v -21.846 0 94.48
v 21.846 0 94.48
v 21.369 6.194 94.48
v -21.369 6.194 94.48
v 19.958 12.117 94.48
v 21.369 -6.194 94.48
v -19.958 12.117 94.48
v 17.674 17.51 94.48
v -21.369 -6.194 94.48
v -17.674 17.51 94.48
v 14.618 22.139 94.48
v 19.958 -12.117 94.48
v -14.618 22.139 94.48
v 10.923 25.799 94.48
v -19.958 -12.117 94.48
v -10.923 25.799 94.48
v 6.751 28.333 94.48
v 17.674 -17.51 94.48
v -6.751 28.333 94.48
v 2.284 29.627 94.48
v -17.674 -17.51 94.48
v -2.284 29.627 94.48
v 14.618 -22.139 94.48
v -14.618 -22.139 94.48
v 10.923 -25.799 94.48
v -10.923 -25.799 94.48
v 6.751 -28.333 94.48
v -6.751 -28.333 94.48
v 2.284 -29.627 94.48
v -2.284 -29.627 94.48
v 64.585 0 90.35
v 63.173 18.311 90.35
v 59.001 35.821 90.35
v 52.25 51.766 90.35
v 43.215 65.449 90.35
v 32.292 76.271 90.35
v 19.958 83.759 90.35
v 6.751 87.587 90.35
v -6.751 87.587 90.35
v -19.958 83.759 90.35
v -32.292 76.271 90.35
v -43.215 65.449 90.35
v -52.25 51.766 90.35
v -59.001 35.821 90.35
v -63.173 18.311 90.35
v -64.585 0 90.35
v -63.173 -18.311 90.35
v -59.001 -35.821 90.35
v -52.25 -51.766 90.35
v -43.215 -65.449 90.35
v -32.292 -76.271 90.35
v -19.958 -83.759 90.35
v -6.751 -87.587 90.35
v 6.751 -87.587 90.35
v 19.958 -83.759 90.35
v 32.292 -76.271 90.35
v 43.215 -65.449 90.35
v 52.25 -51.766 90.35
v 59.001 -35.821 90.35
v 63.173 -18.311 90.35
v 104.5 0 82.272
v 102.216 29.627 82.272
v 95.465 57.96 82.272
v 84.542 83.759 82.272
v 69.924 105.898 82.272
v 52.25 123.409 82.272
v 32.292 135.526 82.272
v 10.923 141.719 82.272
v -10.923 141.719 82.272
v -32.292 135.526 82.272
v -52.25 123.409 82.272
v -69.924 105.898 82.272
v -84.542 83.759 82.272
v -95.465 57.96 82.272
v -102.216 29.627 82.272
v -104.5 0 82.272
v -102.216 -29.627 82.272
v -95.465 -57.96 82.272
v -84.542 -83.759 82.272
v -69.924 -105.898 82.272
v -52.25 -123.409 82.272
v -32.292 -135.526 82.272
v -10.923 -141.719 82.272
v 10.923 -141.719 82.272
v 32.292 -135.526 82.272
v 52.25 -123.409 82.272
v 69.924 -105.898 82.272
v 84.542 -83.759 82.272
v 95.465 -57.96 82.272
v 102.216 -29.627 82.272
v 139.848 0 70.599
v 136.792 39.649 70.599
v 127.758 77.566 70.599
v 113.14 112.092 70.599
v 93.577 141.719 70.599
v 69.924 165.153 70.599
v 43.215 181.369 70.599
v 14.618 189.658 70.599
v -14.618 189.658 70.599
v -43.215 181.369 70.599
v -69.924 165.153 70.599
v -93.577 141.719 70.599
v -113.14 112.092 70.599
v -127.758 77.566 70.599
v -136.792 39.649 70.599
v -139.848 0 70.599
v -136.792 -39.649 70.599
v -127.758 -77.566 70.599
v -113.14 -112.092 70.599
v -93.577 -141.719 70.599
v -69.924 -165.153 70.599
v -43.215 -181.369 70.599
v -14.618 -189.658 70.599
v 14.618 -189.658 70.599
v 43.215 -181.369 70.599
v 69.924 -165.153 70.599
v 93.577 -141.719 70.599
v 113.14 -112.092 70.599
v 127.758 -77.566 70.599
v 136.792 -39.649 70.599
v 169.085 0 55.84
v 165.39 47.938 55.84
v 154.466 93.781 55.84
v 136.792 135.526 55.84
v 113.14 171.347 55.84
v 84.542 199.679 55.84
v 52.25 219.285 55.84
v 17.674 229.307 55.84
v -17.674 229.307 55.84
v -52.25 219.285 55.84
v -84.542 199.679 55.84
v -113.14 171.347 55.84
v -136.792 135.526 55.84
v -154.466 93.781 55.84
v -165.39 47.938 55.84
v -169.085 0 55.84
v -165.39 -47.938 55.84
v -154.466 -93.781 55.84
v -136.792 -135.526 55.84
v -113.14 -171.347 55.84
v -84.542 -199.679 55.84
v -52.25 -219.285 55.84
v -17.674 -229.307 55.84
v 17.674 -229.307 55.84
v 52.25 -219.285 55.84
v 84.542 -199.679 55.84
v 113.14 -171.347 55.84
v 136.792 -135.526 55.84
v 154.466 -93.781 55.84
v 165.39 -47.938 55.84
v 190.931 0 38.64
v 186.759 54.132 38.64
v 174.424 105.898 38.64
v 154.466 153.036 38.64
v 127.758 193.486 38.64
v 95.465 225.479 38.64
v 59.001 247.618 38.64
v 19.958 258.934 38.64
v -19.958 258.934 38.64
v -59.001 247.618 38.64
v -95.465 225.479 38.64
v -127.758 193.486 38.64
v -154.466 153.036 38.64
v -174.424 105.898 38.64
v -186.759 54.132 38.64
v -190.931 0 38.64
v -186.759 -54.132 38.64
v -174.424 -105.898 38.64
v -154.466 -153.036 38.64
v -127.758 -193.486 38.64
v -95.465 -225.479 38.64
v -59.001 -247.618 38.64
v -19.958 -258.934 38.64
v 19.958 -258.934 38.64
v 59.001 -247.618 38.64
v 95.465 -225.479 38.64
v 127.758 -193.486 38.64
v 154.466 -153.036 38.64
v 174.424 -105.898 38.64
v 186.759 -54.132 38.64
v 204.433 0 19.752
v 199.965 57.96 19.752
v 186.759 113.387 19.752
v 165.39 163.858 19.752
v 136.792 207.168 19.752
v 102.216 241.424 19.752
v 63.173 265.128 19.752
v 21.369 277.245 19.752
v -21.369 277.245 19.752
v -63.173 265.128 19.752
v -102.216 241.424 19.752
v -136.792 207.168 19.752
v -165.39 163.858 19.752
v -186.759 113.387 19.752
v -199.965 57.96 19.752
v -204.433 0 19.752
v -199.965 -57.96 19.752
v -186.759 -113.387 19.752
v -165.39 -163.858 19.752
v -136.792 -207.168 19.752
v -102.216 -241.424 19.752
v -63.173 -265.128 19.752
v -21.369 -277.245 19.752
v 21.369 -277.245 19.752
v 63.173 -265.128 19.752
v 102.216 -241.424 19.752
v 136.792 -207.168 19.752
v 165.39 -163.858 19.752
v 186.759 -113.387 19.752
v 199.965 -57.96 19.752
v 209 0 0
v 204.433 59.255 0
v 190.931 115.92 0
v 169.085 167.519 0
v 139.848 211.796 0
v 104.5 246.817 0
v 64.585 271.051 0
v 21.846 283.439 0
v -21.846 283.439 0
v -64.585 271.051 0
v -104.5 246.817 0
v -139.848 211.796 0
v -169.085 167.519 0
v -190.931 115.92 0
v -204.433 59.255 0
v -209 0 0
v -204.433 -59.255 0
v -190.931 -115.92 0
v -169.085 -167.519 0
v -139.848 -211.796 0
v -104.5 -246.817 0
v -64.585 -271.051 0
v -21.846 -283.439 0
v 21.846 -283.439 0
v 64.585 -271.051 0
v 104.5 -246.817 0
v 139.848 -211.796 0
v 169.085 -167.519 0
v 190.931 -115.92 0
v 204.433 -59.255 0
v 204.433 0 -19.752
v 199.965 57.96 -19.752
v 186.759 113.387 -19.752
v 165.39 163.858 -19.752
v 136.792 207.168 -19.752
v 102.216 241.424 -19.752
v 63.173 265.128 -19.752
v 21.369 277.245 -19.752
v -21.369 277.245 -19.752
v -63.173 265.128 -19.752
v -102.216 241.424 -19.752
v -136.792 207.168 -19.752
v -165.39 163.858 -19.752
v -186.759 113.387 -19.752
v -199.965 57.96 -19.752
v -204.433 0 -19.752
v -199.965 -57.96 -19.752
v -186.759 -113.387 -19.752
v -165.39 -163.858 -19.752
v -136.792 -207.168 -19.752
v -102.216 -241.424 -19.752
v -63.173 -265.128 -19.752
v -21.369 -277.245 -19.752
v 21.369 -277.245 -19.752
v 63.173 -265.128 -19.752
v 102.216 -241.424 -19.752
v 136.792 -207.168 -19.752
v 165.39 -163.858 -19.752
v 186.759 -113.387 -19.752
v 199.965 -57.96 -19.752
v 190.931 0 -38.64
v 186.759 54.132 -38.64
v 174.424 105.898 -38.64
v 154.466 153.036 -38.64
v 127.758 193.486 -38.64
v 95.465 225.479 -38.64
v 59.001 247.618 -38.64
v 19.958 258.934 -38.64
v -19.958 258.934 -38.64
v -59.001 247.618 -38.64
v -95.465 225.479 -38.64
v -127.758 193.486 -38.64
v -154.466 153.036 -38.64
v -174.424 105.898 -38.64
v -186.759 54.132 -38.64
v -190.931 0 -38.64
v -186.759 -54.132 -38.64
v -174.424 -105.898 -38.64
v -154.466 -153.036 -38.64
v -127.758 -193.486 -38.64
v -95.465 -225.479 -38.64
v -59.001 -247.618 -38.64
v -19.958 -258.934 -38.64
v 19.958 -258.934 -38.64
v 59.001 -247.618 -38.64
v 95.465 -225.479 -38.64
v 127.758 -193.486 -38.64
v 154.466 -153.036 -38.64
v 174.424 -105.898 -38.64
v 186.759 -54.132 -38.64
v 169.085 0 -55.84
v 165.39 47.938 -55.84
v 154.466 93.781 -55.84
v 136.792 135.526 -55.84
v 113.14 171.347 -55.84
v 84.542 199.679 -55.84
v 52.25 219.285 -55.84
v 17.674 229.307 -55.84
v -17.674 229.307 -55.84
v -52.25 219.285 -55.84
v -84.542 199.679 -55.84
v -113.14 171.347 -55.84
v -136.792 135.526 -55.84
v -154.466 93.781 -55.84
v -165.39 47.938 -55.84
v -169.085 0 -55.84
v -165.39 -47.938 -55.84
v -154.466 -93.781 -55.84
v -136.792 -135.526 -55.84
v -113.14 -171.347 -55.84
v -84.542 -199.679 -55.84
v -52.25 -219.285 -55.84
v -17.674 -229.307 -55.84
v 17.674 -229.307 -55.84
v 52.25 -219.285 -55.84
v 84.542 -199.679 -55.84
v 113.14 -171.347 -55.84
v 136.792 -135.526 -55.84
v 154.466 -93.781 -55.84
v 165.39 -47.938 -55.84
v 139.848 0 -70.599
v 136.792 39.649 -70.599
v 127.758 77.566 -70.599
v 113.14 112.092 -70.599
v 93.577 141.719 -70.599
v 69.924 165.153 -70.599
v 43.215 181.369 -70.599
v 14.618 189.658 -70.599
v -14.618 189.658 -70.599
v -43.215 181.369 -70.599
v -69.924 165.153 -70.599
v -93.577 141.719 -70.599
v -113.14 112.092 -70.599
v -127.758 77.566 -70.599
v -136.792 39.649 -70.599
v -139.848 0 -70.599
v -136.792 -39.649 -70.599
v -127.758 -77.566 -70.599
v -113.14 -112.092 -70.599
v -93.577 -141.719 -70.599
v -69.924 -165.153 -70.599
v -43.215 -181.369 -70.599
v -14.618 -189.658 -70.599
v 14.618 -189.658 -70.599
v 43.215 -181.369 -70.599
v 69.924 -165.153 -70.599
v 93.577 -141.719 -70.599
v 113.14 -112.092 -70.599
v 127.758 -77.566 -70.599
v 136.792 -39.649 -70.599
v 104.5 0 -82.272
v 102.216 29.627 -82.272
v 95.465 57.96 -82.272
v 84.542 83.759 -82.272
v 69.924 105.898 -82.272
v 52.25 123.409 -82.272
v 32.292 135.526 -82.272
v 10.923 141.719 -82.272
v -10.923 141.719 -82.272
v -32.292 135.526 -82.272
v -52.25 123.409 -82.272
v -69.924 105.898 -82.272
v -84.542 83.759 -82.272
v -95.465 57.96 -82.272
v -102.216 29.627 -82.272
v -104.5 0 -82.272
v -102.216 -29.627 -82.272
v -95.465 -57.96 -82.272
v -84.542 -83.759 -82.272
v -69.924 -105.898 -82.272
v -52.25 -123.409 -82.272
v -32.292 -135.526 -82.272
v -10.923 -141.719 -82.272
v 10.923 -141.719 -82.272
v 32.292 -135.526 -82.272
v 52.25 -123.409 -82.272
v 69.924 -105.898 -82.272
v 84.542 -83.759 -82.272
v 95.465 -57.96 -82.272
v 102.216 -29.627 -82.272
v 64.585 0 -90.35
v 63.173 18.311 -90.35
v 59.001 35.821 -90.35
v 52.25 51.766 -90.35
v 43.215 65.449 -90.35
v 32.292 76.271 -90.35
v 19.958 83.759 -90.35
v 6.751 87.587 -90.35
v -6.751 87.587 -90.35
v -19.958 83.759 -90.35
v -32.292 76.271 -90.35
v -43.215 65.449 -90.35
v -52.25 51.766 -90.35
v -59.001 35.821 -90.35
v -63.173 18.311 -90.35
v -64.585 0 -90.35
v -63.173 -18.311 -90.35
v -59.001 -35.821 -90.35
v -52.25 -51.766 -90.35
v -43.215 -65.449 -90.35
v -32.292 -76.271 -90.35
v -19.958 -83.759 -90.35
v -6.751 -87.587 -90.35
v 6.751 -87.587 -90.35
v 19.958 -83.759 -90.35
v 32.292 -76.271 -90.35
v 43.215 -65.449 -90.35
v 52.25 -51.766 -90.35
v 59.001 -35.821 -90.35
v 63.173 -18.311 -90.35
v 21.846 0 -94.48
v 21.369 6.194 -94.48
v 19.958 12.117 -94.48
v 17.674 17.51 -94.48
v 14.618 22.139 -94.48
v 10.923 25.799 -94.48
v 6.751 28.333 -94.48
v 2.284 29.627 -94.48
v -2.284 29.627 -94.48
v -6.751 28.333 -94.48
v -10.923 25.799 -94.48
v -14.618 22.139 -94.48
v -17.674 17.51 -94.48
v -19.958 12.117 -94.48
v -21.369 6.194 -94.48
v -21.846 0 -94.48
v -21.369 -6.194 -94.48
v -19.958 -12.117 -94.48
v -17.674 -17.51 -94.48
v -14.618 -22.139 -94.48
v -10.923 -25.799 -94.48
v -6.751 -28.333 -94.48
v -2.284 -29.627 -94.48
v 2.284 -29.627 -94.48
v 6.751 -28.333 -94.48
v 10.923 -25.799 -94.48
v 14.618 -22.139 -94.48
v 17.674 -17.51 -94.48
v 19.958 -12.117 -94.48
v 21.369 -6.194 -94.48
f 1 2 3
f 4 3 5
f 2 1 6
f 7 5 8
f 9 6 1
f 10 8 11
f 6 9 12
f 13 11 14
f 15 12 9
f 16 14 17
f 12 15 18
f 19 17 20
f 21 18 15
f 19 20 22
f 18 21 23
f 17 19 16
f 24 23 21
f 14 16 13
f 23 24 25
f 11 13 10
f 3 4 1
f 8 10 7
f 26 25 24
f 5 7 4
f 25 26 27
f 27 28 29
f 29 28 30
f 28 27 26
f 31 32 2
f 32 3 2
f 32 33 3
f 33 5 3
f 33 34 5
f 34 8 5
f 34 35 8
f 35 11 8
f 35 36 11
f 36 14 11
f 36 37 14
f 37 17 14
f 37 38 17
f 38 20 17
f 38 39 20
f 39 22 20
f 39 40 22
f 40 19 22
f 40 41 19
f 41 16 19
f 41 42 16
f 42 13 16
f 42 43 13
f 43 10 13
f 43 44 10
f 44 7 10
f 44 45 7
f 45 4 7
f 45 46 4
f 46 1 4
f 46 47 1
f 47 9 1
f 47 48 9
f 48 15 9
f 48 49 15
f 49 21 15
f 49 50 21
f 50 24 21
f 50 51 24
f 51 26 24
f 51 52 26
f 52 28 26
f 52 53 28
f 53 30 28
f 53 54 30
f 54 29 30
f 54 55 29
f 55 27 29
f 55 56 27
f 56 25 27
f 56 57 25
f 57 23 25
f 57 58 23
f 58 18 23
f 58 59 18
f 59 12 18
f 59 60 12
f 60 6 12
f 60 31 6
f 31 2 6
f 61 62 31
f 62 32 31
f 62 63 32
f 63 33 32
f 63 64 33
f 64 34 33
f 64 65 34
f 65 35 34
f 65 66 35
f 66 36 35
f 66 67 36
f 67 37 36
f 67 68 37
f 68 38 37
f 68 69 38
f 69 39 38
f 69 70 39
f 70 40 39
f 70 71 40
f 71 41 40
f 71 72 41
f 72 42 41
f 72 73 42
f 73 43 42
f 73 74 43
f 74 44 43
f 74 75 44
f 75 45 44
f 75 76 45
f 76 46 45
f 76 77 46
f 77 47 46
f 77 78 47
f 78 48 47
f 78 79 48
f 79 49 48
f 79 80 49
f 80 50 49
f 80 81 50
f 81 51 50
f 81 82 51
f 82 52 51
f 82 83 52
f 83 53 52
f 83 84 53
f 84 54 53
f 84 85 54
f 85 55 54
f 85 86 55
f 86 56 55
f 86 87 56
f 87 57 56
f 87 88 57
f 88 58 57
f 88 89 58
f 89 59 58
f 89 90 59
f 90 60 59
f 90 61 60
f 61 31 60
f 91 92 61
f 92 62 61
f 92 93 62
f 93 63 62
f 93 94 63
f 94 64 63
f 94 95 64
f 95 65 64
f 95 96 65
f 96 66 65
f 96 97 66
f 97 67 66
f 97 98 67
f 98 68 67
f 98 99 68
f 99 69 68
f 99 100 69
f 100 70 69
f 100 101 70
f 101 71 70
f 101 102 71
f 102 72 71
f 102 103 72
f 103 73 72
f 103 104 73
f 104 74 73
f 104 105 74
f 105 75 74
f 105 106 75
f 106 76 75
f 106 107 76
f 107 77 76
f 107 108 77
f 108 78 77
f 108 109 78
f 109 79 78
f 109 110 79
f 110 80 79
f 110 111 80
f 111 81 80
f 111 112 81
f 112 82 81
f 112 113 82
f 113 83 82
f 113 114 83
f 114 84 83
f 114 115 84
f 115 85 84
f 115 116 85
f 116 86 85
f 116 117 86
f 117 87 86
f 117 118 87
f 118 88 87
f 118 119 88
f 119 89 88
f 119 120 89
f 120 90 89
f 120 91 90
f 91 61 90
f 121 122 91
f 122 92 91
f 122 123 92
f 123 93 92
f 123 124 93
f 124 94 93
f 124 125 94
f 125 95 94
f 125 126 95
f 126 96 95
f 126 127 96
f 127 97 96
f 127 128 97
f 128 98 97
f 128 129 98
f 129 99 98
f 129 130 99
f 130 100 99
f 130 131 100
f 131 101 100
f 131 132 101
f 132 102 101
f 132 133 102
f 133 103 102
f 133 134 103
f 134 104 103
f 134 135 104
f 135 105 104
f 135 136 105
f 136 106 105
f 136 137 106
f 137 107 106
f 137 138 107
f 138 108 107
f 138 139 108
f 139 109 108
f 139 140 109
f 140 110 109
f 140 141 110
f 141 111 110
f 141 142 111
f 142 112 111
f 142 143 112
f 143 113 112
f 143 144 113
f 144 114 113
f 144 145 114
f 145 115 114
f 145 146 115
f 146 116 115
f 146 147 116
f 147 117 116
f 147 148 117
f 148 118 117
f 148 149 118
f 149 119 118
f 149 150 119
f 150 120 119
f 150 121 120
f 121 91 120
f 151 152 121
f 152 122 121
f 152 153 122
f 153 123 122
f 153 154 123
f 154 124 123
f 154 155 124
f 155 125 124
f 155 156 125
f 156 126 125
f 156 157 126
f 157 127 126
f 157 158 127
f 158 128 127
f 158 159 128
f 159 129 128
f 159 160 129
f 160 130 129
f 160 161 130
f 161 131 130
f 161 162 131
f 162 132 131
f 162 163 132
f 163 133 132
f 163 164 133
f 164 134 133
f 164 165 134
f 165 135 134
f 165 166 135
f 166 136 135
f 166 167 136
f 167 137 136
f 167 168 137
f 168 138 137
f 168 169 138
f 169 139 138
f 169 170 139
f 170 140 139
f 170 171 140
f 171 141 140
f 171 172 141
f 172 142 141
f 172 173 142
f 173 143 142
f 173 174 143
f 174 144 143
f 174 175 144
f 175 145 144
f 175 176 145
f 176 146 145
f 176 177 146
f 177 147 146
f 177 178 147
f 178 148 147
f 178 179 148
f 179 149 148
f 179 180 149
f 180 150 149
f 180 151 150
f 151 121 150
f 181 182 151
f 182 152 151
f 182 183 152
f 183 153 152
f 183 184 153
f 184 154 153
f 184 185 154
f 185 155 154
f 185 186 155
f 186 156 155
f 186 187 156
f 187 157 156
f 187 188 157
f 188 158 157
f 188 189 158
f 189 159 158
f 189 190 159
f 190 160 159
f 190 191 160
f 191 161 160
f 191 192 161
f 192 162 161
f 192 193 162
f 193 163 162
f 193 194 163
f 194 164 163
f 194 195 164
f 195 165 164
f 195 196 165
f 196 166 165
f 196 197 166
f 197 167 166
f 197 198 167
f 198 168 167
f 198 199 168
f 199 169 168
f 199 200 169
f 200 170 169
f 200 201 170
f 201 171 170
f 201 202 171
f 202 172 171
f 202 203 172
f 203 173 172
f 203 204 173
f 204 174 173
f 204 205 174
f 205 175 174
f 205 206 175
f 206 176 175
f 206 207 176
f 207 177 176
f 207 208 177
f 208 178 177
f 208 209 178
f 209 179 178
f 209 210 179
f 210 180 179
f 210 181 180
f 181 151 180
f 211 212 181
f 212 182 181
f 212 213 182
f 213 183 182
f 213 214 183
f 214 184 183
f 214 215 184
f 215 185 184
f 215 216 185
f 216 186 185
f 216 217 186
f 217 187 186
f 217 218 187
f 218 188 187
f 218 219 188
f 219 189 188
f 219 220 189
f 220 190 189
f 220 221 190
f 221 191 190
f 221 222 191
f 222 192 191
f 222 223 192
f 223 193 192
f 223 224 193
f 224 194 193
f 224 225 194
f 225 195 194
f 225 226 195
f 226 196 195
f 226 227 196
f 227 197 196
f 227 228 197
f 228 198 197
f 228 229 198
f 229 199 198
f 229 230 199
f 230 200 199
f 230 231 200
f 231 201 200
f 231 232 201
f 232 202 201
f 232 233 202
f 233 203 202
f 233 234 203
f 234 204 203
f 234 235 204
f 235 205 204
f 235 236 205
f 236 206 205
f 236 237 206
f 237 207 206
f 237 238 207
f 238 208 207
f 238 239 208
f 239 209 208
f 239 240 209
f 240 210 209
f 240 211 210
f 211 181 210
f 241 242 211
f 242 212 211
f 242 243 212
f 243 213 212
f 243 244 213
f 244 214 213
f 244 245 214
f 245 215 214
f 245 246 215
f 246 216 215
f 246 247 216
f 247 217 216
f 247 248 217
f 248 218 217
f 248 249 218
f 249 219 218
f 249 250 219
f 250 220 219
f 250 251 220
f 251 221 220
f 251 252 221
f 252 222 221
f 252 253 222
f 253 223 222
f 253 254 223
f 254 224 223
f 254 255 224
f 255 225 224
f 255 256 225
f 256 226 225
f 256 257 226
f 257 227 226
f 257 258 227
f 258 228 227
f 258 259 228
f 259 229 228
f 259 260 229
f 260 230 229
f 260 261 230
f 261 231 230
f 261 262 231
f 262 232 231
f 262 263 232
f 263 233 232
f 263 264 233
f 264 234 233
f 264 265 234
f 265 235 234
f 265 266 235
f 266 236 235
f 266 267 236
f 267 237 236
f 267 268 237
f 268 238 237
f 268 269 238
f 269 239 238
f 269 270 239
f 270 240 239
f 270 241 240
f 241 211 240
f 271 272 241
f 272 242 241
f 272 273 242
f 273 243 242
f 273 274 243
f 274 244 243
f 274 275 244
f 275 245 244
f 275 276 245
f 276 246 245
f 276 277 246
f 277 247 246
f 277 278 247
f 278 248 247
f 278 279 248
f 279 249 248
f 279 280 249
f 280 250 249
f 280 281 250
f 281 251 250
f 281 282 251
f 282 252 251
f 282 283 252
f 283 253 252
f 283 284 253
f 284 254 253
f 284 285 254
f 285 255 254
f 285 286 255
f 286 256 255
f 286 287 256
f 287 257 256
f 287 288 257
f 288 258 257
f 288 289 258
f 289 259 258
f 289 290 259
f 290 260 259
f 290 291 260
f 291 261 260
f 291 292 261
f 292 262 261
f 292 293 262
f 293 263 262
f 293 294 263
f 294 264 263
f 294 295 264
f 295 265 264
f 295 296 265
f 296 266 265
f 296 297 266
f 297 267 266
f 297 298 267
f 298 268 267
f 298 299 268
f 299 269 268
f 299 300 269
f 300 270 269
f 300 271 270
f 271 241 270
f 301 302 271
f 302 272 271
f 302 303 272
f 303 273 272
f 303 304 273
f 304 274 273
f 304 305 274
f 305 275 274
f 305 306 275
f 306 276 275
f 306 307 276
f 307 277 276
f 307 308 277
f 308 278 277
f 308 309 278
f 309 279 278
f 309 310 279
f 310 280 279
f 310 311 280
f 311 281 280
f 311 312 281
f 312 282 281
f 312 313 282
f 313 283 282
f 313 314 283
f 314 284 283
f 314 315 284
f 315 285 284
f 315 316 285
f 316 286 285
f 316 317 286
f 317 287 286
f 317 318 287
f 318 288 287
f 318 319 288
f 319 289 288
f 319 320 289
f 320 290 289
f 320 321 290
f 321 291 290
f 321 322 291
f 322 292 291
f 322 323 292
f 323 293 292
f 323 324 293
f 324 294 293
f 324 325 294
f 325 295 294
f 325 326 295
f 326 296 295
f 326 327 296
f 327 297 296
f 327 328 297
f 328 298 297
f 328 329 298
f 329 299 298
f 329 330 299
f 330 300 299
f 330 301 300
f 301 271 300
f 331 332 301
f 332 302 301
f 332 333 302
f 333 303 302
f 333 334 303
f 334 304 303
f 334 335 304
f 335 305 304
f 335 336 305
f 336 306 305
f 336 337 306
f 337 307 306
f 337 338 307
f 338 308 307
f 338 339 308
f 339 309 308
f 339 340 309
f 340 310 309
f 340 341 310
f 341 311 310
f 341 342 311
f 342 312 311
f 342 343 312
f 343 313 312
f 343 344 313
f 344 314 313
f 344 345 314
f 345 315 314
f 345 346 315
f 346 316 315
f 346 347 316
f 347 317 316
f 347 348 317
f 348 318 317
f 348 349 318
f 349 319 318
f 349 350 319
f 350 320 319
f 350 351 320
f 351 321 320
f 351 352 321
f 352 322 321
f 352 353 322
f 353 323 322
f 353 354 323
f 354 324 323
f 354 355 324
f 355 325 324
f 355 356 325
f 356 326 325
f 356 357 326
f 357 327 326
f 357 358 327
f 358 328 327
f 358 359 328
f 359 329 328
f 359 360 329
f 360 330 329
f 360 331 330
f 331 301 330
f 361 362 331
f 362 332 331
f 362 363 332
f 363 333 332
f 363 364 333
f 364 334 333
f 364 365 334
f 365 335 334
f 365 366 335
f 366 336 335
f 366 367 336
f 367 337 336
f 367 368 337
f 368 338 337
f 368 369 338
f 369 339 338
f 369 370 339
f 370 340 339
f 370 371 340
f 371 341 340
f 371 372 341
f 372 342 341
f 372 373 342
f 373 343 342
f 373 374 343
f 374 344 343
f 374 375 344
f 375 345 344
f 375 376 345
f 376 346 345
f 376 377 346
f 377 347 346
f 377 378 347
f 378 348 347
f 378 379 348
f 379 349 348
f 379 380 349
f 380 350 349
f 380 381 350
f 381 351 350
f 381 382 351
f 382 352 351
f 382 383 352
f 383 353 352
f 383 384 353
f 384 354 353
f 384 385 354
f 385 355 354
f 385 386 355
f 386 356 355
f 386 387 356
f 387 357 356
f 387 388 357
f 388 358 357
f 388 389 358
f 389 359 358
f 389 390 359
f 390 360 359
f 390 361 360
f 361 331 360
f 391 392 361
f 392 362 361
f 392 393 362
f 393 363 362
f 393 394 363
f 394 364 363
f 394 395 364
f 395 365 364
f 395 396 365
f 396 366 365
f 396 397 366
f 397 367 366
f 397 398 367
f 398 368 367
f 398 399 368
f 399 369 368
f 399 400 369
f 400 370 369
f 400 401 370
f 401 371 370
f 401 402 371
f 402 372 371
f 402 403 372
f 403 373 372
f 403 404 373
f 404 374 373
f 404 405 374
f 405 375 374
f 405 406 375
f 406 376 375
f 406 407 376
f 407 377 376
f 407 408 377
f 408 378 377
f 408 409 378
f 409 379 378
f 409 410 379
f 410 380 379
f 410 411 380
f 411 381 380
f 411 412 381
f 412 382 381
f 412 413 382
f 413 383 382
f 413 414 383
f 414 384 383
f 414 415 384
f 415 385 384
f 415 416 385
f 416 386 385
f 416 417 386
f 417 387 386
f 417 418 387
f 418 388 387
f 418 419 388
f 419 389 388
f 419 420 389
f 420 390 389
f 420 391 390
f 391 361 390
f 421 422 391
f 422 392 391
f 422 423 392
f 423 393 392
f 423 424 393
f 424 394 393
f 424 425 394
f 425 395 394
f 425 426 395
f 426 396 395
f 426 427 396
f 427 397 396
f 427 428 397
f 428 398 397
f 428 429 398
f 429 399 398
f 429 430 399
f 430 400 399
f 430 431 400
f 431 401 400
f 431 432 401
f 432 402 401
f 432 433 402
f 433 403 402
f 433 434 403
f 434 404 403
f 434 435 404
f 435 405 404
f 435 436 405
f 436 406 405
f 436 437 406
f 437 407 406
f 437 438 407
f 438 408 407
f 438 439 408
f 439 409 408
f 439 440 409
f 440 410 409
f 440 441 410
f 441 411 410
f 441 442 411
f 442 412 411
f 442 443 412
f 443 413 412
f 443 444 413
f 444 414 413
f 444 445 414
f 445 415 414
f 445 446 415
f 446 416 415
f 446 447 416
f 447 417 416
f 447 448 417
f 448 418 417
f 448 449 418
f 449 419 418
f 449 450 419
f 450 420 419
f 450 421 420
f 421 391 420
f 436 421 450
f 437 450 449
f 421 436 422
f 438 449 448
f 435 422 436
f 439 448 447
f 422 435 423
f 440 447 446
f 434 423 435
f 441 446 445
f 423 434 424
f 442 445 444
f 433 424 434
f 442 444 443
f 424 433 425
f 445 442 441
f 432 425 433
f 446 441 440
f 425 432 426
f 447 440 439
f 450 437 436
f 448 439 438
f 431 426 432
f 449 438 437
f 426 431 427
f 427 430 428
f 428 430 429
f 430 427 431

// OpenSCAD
// Generated by SolidPython 1.0.1 on 2020-07-29 00:46:50


scale(v = [11, 15, 5]) {
	sphere(r = 19);
}
/***********************************************
*********      SolidPython code:      **********
************************************************
 
# import packages: SolidPython
from solid import *
from solid.utils import *
from itertools import chain, combinations, permutations


class Resize:

    def __init__(self, scad_file):
        self.scad_file = scad_file
        #self.scad_file = import_scad(scad_file)
        # cone/cylinder param:
        self.r1 = 0
        self.r2 = 0
        self.h = 0
        # rectangular prism param:
        self.w = 0
        self.l = 0
        # ellipse param:
        self.r = 0

    # import OpenScad code (file name corresponds to shape)


    # classify shape + parameters
    def assign(self, param1, param2, param3):
        if self.scad_file == 'cone.scad':
            self.r1 = param1
            self.r2 = param2
            self.h = param3
        elif self.scad_file == 'cylinder.scad':
            self.r1 = param1
            self.r2 = param2
            self.h = param3
        elif self.scad_file == 'rectangularPrism.scad':
            self.h = param1
            self.l = param2
            self.w = param3
        else:
            self.r = param1
            self.h = param2

    # resize parameters
    def iterate(self):
        x = range(3, 20, 2)
        i = 1
        if self.scad_file == 'cone.scad':
            tempList = list(permutations(x, 2))
            for temp in tempList:
                param1 = temp[0]
                param2 = temp[1]
                filepath = 'produced_scad_files/' + 'cone' + str(param1) + '_' + str(param2) + '_' + '.scad'
                scad_render_to_file(cylinder(h=param1, r1=param2, r2=0), filepath)

        elif self.scad_file == 'cylinder.scad':
            tempList = list(permutations(x, 3))
            for temp in tempList:
                param1 = temp[0]
                param2 = temp[1]
                filepath = 'produced_scad_files/' + 'cylinder' + str(param1) + '_' + str(param2) + '_' + '.scad'
                scad_render_to_file(cylinder(h=param1, r1=param2, r2=param2), filepath)

        elif self.scad_file == 'rectangularPrism.scad':
            tempList = list(permutations(x, 3))
            for temp in tempList:
                param1 = temp[0]
                param2 = temp[1]
                param3 = temp[2]
                filepath = 'produced_scad_files/' + 'rectangularPrism' + str(param1) + '_' + str(param2) + '_' + str(
                    param3) + '.scad'
                scad_render_to_file(cube(size=(param1, param2, param3)), filepath)

        elif self.scad_file == 'ellipse.scad':
            tempList = list(permutations(x, 4))
            for temp in tempList:
                param1 = temp[0]
                param2 = temp[1]
                param3 = temp[2]
                param4 = temp[3]
                filepath = 'produced_scad_files/' + 'ellipse' + str(param1) + '_' + str(param2) + '_' + str(param3) + '_' + str(param4) + '.scad'
                scad_render_to_file(scale([param1, param2, param3])(sphere(r=param4)), filepath)

    def render_to_scadfile(self):
        scad_render_to_file(scad, 'example.scad') 
 
************************************************/
